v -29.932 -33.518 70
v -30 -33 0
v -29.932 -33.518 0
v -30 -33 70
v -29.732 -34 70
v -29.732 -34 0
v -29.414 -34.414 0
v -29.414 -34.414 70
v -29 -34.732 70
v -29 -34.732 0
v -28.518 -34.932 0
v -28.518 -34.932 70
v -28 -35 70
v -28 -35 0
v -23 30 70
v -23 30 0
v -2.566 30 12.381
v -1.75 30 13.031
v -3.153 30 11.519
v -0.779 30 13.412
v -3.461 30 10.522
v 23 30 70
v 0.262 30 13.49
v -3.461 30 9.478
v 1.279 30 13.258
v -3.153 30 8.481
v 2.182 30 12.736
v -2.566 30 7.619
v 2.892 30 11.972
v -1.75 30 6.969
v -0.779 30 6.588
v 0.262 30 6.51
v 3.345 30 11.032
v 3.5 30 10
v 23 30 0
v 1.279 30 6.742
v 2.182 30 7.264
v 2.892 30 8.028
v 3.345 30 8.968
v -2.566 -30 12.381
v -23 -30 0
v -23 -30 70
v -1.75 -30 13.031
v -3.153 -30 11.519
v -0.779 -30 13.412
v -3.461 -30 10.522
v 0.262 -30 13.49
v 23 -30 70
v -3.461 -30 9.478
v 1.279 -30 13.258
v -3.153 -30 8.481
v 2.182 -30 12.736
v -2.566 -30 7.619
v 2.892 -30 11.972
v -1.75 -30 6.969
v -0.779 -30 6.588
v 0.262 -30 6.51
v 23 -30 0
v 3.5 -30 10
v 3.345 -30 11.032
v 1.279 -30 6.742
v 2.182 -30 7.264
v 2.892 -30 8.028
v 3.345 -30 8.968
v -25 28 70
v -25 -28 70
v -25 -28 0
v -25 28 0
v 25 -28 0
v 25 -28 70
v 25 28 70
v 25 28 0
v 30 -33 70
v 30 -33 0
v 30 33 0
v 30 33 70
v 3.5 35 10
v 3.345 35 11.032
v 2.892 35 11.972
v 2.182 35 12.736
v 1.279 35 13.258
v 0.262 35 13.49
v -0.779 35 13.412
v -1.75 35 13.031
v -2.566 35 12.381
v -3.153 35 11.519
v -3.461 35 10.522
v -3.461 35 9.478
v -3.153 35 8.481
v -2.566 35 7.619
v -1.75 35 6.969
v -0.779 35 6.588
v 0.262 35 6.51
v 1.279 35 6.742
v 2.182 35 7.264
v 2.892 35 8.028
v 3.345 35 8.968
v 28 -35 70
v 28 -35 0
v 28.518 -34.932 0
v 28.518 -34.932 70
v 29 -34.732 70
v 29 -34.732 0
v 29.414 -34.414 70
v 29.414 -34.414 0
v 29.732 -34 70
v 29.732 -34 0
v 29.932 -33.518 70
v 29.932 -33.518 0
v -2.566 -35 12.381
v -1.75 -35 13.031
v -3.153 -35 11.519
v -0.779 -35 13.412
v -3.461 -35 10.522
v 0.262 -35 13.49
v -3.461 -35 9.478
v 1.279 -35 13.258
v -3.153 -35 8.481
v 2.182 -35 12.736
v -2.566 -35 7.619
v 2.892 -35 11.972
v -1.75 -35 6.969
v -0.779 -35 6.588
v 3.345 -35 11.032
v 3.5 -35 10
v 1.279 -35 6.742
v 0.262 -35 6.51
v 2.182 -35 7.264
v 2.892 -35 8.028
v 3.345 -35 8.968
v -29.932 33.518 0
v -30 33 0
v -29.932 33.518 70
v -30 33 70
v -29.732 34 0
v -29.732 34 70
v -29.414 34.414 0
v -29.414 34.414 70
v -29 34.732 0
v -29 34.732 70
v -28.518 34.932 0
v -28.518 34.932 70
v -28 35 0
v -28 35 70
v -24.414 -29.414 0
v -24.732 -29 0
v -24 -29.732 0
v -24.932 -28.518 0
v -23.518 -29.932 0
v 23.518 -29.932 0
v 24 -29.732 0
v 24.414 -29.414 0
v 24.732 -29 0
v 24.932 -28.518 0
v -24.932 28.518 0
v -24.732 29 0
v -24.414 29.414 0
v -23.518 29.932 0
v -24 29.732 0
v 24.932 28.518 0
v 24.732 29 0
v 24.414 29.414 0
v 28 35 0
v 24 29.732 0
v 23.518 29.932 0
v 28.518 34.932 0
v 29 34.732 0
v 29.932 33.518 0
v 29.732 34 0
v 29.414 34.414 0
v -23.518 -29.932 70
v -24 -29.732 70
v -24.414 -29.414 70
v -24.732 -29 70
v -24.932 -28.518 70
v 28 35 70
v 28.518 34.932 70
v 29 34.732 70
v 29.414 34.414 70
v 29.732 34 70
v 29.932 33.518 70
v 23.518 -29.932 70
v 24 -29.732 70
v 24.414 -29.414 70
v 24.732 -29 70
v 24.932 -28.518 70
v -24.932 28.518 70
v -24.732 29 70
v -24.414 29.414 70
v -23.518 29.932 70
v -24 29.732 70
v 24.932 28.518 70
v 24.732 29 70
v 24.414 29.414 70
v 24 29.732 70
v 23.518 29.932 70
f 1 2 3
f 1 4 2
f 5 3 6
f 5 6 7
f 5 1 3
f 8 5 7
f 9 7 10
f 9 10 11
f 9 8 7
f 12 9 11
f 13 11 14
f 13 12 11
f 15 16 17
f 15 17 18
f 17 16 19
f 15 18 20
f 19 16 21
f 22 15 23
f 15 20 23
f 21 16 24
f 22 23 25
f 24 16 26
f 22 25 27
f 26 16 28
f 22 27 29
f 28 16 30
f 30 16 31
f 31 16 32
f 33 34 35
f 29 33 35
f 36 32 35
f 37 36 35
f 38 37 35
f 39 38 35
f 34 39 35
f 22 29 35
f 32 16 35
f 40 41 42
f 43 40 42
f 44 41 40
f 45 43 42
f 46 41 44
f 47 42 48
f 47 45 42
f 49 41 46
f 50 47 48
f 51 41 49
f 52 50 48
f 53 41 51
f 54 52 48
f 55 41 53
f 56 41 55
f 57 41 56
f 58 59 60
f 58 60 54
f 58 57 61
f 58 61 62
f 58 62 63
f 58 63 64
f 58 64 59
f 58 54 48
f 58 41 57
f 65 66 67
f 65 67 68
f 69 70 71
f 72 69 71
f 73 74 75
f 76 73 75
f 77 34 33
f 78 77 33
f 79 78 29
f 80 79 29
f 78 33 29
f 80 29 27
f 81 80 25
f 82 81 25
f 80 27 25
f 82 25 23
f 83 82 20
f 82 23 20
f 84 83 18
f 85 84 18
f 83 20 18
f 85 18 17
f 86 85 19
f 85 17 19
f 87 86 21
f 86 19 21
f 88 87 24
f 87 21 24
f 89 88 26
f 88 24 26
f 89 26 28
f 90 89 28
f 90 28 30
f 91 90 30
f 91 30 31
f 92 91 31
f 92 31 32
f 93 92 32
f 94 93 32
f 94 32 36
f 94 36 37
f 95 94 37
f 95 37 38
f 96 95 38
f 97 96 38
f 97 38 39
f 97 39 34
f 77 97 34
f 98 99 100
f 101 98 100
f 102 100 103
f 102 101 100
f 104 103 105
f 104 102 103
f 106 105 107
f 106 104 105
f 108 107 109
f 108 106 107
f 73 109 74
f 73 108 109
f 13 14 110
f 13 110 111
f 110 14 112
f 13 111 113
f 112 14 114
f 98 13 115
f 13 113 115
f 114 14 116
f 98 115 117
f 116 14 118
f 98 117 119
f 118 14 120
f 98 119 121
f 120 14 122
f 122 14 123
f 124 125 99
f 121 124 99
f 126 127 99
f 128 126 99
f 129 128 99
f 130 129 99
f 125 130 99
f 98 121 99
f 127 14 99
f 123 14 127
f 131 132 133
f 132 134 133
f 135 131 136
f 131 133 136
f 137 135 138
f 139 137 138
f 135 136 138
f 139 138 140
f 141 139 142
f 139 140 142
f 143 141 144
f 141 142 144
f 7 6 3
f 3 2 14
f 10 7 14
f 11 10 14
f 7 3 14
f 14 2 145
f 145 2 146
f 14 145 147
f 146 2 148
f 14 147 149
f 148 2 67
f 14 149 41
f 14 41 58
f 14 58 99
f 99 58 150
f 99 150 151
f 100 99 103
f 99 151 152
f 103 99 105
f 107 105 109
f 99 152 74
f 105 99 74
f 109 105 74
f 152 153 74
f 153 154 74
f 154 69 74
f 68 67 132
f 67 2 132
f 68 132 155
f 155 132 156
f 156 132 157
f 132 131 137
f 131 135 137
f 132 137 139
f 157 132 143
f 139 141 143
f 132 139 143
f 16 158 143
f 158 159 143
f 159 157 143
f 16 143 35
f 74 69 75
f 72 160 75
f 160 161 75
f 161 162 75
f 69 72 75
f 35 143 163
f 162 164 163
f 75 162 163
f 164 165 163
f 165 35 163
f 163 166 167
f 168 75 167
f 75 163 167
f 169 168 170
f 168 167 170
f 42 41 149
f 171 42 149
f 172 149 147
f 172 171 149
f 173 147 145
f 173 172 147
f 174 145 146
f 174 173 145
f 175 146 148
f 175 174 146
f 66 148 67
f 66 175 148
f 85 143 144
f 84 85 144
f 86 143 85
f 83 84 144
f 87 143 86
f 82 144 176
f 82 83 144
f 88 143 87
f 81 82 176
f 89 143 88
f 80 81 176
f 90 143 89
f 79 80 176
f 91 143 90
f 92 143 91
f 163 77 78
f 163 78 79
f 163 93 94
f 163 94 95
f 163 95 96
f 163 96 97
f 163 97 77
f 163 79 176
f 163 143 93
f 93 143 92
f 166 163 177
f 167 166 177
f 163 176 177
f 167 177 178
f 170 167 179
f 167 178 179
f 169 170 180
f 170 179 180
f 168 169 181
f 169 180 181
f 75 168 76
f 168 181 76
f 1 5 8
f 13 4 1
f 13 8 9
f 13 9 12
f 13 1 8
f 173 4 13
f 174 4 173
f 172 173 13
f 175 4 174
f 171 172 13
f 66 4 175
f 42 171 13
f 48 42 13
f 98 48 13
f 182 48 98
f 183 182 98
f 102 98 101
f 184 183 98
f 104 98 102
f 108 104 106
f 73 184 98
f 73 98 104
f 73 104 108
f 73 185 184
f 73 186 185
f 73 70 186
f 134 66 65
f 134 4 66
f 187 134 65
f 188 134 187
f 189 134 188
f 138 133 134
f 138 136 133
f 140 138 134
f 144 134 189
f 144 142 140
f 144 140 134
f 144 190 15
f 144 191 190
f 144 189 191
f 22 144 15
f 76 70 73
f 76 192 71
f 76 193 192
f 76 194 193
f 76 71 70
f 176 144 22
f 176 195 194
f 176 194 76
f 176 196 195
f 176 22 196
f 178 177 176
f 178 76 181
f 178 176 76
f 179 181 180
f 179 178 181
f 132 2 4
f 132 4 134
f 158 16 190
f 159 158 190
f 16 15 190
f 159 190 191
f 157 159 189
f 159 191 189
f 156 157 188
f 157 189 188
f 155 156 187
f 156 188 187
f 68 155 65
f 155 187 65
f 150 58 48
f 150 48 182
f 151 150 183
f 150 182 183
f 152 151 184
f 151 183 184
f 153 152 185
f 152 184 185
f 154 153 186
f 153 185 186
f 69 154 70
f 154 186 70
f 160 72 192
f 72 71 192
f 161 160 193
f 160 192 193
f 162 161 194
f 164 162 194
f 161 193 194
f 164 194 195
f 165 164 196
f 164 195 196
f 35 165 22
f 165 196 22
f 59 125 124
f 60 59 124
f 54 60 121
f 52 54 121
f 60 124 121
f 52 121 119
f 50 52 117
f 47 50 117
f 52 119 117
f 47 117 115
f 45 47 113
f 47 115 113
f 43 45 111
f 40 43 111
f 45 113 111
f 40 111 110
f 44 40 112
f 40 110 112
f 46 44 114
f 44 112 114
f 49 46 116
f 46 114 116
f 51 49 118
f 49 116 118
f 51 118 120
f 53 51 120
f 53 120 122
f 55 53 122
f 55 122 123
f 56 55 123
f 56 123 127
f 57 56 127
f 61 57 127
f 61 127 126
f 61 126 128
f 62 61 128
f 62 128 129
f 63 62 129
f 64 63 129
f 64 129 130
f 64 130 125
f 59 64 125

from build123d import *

# Parameters (mm, degrees)
F0_W     = 60
F0_H     = 70
F0_W_2   = 50
F0_H_2   = 60
F1_DEPTH = 70
F2_R     = 2
F3_R     = 3.5
F4_DEPTH = 70


with BuildPart() as f1:
    # F0 (on Top) → F1 (new body)
    with BuildSketch(Plane.XY):
        Rectangle(F0_W, F0_H)
        Rectangle(F0_W_2, F0_H_2, mode=Mode.SUBTRACT)
    extrude(amount=F1_DEPTH)

    # F2
    f2_edges = [f1.edges().sort_by_distance(p)[0] for p in [
        (-30, 35, 35),
        (30, 35, 35),
        (30, -35, 35),
        (-30, -35, 35),
        (25, 30, 35),
        (-25, -30, 35),
        (-25, 30, 35),
        (25, -30, 35),
    ]]
    fillet(f2_edges, radius=F2_R)

    # F3 (on face) → F4 (cut)
    with BuildSketch(Plane.XZ.offset(35)):
        with Locations((0, 10)):
            Circle(F3_R)
    extrude(amount=-F4_DEPTH, mode=Mode.SUBTRACT)


solid = f1.part
